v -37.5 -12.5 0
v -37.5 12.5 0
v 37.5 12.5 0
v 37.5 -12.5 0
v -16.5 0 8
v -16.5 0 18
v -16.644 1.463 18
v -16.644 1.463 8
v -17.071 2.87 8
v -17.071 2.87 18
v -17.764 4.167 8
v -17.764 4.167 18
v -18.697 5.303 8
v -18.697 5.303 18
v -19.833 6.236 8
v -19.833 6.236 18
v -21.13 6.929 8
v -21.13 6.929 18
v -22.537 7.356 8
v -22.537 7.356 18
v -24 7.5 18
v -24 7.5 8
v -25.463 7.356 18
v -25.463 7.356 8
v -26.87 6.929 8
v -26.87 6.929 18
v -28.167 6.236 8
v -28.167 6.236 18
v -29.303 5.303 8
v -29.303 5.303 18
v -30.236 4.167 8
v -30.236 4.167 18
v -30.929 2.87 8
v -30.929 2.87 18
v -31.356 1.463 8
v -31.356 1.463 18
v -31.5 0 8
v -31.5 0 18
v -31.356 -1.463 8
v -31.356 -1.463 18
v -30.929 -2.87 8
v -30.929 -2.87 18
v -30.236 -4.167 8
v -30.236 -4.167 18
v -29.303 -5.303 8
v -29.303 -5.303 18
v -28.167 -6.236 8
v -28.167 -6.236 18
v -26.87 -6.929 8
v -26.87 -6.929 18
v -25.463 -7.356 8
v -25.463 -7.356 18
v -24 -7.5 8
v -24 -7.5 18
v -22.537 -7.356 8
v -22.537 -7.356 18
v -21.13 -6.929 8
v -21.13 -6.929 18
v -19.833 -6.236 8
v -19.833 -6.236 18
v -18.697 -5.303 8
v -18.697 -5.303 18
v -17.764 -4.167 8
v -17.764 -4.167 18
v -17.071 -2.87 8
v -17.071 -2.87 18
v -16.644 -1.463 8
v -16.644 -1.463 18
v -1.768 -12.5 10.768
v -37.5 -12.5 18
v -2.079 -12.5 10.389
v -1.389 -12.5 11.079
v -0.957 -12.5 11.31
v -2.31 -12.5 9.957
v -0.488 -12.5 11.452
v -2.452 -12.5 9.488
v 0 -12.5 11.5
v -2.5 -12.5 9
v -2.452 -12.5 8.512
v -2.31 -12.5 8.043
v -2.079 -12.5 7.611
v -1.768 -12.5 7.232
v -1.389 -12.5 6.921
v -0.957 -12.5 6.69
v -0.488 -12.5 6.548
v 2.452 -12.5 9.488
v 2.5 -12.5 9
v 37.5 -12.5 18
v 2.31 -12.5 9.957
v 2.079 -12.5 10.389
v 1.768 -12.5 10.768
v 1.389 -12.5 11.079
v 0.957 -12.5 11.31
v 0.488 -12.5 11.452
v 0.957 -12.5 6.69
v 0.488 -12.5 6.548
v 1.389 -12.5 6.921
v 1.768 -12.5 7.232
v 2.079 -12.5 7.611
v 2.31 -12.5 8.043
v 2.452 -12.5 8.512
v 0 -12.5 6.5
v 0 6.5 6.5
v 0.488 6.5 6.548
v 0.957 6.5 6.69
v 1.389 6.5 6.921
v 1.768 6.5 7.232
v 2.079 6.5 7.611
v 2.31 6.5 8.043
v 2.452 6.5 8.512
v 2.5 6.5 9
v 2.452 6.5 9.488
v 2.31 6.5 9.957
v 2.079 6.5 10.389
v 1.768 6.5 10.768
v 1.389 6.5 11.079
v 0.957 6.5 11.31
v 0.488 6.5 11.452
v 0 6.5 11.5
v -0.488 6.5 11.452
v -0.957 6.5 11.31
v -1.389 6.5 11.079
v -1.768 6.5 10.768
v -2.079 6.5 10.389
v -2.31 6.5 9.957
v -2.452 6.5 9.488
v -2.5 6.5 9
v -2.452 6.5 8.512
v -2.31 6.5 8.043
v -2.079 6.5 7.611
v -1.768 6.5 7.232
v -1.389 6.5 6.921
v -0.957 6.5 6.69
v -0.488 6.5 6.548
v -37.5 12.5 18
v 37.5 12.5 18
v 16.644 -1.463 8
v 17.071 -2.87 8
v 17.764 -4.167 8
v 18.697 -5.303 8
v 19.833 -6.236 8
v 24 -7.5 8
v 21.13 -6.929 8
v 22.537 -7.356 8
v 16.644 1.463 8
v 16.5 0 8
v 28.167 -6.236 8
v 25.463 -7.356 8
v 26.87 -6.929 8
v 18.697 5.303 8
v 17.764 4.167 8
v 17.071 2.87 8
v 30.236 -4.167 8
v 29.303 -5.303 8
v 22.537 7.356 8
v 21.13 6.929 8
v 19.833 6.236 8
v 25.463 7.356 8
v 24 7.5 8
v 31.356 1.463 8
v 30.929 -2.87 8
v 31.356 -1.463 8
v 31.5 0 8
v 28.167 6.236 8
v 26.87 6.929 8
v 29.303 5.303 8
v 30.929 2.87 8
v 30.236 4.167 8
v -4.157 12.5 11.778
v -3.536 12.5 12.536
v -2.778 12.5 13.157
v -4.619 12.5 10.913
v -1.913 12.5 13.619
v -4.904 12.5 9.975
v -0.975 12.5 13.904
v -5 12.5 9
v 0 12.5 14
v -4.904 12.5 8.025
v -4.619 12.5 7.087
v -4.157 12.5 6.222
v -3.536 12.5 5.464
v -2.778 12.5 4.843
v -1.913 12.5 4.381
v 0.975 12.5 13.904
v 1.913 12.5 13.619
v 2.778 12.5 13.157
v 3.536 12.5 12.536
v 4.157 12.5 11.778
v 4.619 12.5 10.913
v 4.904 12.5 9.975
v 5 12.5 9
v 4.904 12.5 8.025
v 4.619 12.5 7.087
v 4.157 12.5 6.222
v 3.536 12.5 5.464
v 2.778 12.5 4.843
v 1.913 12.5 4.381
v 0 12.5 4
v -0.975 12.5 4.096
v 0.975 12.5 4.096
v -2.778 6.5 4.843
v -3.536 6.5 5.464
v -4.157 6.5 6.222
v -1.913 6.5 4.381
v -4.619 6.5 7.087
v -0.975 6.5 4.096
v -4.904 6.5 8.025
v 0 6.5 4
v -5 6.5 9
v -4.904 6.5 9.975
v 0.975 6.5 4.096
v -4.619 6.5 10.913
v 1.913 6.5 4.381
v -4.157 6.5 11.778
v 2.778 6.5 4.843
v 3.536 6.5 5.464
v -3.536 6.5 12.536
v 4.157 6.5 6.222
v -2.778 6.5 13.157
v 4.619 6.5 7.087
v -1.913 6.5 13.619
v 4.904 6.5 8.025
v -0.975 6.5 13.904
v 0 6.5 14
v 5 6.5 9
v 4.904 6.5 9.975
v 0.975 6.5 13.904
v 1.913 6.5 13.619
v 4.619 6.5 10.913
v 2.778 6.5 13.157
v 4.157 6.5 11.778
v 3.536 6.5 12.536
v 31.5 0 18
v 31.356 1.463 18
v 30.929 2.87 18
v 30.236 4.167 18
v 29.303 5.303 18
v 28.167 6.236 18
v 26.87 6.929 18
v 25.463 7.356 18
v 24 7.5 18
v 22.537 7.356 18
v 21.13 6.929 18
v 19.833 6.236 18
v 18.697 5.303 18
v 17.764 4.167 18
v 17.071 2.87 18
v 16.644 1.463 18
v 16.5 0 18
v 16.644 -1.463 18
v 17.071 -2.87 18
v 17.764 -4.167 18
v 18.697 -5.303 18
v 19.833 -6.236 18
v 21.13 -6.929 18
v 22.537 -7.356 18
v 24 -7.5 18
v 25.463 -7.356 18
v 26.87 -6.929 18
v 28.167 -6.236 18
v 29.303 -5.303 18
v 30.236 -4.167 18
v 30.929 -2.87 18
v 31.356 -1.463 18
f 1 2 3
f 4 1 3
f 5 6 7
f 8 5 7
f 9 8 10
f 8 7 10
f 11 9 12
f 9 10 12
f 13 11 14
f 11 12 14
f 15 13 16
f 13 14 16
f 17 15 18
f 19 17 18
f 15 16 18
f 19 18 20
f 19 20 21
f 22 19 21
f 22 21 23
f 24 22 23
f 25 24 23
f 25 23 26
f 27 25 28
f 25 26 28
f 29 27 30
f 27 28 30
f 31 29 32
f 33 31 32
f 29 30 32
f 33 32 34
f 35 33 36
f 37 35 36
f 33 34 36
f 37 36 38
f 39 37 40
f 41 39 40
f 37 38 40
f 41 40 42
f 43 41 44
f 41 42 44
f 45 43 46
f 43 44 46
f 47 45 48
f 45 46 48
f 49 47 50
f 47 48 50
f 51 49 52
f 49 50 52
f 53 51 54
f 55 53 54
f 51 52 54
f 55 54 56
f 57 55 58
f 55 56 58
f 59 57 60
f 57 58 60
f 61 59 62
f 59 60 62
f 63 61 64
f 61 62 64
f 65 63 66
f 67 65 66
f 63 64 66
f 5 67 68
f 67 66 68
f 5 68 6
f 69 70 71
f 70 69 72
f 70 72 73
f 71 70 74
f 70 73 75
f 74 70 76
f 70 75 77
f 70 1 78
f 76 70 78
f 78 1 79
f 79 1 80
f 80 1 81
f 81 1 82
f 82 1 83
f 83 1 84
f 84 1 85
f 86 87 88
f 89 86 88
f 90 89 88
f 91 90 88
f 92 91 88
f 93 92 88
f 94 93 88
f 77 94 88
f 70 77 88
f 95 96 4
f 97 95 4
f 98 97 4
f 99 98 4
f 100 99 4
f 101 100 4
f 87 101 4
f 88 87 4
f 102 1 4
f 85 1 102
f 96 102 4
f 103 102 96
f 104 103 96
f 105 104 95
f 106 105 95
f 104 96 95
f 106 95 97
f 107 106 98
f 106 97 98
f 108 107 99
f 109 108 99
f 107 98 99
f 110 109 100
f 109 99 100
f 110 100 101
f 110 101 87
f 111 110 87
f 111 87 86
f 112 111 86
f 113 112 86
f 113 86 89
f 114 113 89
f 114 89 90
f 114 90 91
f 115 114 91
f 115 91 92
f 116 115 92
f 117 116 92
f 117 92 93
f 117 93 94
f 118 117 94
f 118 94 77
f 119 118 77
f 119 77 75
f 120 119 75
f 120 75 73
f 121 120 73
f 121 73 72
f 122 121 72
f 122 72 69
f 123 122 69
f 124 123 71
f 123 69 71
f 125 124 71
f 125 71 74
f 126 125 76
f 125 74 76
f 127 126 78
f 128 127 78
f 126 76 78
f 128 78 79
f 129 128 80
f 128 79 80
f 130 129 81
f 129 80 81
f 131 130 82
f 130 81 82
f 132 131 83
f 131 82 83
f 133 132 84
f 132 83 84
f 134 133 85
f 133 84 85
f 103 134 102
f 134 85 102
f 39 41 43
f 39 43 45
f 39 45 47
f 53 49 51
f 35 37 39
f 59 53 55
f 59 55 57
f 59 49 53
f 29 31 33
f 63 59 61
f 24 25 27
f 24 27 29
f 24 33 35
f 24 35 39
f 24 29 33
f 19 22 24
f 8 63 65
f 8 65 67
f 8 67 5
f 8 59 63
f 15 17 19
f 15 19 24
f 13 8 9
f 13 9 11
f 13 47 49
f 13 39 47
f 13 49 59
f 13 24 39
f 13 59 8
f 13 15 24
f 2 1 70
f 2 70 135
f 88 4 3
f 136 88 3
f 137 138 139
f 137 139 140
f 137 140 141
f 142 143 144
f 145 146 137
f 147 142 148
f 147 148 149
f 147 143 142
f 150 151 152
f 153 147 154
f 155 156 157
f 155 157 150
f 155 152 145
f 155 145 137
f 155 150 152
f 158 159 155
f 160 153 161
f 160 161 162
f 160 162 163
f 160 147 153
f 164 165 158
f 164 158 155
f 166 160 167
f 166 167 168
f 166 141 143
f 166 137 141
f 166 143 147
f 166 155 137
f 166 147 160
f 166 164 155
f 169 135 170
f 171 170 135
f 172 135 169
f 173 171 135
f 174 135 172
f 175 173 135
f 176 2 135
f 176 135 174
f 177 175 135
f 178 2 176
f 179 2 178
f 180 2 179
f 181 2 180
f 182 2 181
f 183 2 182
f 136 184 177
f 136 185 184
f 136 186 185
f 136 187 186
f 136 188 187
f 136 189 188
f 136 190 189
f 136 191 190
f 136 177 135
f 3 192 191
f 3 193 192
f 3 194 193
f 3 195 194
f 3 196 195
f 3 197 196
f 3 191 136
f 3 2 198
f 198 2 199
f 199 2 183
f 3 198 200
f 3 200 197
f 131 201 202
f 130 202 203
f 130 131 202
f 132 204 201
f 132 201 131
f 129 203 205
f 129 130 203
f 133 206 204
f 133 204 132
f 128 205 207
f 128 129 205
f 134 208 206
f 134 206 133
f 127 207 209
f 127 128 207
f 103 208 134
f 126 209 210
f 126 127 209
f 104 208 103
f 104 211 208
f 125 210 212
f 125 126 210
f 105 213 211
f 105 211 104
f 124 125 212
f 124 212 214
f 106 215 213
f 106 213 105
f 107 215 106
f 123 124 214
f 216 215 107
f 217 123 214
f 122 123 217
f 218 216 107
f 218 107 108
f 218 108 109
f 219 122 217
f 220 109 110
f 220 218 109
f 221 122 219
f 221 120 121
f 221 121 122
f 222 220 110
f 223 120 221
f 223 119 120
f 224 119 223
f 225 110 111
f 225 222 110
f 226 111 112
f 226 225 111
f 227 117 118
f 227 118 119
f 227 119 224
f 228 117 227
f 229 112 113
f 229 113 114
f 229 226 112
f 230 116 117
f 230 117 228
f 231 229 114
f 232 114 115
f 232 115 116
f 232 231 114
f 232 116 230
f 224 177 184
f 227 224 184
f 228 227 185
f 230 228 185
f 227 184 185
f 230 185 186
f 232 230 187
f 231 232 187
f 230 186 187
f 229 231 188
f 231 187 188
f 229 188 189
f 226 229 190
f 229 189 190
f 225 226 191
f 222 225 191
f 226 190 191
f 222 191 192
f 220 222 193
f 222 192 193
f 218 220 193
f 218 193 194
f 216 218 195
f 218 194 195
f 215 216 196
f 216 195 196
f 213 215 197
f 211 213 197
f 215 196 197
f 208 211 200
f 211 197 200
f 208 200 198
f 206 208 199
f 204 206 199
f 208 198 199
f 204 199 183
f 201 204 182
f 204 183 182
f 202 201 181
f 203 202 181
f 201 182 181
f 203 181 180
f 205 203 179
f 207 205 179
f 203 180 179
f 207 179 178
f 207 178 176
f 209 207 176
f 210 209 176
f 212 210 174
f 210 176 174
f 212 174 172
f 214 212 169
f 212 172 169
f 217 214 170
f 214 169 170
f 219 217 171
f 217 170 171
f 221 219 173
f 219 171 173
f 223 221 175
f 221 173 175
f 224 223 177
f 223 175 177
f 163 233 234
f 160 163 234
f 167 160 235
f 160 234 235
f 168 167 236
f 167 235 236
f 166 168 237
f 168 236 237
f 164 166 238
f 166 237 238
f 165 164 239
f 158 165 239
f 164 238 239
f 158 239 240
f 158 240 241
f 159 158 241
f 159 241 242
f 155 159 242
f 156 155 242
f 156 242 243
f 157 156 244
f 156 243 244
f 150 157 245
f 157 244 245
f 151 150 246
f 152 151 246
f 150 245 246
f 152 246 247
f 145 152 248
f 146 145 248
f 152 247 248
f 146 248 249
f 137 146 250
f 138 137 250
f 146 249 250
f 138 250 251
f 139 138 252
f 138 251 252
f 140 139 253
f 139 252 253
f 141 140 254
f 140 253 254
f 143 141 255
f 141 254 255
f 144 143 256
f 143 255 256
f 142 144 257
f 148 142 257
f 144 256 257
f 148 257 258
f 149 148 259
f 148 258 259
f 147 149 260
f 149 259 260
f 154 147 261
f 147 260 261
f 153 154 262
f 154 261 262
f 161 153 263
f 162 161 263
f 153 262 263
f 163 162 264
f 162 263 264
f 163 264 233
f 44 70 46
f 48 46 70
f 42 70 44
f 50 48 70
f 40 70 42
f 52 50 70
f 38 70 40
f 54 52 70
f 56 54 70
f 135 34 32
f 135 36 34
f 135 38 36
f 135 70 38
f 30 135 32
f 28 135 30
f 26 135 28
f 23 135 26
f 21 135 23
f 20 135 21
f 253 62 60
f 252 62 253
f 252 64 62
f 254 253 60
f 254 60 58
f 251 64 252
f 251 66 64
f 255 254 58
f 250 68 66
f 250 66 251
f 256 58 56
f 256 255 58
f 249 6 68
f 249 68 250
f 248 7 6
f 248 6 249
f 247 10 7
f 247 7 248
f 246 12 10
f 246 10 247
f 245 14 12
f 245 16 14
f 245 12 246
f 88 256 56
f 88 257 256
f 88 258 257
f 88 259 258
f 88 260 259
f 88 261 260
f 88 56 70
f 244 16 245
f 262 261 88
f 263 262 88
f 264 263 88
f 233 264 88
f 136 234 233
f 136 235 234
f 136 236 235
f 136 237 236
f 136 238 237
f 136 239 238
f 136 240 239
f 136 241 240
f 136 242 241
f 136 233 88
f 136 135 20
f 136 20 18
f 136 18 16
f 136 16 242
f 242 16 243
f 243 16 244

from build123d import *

# Parameters (mm, degrees)
SKETCH1_W           = 75
SKETCH1_H           = 25
BOSS_EXTRUDE1_DEPTH = 18
SKETCH2_R           = 7.5
CUT_EXTRUDE1_DEPTH  = 10
SKETCH3_R           = 2.5
CUT_EXTRUDE2_DEPTH  = 49.53091798
SKETCH4_R           = 5
CUT_EXTRUDE3_DEPTH  = 6


with BuildPart() as part:
    # Sketch1 → Boss-Extrude1 (new body)
    with BuildSketch(Plane.XY):
        Rectangle(SKETCH1_W, SKETCH1_H)
    extrude(amount=BOSS_EXTRUDE1_DEPTH)

    # Sketch2 → Cut-Extrude1 (cut)
    with BuildSketch(Plane.XY.offset(18)):
        with Locations((-24, 0)):
            Circle(SKETCH2_R)
        with Locations((24, 0)):
            Circle(SKETCH2_R)
    extrude(amount=-CUT_EXTRUDE1_DEPTH, mode=Mode.SUBTRACT)

    # Sketch3 → Cut-Extrude2 (cut, through all)
    with BuildSketch(Plane.XZ.offset(12.5)):
        with Locations(Location((0, 9, 0), (0, 0, 270))):
            Circle(SKETCH3_R)
    extrude(amount=-CUT_EXTRUDE2_DEPTH, mode=Mode.SUBTRACT)

    # Sketch4 → Cut-Extrude3 (cut)
    with BuildSketch(Plane(origin=(0, 12.5, 0), x_dir=(1, 0, 0), z_dir=(0, 1, 0))):
        with Locations(Location((0, -9, 0), (0, 0, 270))):
            Circle(SKETCH4_R)
    extrude(amount=-CUT_EXTRUDE3_DEPTH, mode=Mode.SUBTRACT)


solid = part.part
